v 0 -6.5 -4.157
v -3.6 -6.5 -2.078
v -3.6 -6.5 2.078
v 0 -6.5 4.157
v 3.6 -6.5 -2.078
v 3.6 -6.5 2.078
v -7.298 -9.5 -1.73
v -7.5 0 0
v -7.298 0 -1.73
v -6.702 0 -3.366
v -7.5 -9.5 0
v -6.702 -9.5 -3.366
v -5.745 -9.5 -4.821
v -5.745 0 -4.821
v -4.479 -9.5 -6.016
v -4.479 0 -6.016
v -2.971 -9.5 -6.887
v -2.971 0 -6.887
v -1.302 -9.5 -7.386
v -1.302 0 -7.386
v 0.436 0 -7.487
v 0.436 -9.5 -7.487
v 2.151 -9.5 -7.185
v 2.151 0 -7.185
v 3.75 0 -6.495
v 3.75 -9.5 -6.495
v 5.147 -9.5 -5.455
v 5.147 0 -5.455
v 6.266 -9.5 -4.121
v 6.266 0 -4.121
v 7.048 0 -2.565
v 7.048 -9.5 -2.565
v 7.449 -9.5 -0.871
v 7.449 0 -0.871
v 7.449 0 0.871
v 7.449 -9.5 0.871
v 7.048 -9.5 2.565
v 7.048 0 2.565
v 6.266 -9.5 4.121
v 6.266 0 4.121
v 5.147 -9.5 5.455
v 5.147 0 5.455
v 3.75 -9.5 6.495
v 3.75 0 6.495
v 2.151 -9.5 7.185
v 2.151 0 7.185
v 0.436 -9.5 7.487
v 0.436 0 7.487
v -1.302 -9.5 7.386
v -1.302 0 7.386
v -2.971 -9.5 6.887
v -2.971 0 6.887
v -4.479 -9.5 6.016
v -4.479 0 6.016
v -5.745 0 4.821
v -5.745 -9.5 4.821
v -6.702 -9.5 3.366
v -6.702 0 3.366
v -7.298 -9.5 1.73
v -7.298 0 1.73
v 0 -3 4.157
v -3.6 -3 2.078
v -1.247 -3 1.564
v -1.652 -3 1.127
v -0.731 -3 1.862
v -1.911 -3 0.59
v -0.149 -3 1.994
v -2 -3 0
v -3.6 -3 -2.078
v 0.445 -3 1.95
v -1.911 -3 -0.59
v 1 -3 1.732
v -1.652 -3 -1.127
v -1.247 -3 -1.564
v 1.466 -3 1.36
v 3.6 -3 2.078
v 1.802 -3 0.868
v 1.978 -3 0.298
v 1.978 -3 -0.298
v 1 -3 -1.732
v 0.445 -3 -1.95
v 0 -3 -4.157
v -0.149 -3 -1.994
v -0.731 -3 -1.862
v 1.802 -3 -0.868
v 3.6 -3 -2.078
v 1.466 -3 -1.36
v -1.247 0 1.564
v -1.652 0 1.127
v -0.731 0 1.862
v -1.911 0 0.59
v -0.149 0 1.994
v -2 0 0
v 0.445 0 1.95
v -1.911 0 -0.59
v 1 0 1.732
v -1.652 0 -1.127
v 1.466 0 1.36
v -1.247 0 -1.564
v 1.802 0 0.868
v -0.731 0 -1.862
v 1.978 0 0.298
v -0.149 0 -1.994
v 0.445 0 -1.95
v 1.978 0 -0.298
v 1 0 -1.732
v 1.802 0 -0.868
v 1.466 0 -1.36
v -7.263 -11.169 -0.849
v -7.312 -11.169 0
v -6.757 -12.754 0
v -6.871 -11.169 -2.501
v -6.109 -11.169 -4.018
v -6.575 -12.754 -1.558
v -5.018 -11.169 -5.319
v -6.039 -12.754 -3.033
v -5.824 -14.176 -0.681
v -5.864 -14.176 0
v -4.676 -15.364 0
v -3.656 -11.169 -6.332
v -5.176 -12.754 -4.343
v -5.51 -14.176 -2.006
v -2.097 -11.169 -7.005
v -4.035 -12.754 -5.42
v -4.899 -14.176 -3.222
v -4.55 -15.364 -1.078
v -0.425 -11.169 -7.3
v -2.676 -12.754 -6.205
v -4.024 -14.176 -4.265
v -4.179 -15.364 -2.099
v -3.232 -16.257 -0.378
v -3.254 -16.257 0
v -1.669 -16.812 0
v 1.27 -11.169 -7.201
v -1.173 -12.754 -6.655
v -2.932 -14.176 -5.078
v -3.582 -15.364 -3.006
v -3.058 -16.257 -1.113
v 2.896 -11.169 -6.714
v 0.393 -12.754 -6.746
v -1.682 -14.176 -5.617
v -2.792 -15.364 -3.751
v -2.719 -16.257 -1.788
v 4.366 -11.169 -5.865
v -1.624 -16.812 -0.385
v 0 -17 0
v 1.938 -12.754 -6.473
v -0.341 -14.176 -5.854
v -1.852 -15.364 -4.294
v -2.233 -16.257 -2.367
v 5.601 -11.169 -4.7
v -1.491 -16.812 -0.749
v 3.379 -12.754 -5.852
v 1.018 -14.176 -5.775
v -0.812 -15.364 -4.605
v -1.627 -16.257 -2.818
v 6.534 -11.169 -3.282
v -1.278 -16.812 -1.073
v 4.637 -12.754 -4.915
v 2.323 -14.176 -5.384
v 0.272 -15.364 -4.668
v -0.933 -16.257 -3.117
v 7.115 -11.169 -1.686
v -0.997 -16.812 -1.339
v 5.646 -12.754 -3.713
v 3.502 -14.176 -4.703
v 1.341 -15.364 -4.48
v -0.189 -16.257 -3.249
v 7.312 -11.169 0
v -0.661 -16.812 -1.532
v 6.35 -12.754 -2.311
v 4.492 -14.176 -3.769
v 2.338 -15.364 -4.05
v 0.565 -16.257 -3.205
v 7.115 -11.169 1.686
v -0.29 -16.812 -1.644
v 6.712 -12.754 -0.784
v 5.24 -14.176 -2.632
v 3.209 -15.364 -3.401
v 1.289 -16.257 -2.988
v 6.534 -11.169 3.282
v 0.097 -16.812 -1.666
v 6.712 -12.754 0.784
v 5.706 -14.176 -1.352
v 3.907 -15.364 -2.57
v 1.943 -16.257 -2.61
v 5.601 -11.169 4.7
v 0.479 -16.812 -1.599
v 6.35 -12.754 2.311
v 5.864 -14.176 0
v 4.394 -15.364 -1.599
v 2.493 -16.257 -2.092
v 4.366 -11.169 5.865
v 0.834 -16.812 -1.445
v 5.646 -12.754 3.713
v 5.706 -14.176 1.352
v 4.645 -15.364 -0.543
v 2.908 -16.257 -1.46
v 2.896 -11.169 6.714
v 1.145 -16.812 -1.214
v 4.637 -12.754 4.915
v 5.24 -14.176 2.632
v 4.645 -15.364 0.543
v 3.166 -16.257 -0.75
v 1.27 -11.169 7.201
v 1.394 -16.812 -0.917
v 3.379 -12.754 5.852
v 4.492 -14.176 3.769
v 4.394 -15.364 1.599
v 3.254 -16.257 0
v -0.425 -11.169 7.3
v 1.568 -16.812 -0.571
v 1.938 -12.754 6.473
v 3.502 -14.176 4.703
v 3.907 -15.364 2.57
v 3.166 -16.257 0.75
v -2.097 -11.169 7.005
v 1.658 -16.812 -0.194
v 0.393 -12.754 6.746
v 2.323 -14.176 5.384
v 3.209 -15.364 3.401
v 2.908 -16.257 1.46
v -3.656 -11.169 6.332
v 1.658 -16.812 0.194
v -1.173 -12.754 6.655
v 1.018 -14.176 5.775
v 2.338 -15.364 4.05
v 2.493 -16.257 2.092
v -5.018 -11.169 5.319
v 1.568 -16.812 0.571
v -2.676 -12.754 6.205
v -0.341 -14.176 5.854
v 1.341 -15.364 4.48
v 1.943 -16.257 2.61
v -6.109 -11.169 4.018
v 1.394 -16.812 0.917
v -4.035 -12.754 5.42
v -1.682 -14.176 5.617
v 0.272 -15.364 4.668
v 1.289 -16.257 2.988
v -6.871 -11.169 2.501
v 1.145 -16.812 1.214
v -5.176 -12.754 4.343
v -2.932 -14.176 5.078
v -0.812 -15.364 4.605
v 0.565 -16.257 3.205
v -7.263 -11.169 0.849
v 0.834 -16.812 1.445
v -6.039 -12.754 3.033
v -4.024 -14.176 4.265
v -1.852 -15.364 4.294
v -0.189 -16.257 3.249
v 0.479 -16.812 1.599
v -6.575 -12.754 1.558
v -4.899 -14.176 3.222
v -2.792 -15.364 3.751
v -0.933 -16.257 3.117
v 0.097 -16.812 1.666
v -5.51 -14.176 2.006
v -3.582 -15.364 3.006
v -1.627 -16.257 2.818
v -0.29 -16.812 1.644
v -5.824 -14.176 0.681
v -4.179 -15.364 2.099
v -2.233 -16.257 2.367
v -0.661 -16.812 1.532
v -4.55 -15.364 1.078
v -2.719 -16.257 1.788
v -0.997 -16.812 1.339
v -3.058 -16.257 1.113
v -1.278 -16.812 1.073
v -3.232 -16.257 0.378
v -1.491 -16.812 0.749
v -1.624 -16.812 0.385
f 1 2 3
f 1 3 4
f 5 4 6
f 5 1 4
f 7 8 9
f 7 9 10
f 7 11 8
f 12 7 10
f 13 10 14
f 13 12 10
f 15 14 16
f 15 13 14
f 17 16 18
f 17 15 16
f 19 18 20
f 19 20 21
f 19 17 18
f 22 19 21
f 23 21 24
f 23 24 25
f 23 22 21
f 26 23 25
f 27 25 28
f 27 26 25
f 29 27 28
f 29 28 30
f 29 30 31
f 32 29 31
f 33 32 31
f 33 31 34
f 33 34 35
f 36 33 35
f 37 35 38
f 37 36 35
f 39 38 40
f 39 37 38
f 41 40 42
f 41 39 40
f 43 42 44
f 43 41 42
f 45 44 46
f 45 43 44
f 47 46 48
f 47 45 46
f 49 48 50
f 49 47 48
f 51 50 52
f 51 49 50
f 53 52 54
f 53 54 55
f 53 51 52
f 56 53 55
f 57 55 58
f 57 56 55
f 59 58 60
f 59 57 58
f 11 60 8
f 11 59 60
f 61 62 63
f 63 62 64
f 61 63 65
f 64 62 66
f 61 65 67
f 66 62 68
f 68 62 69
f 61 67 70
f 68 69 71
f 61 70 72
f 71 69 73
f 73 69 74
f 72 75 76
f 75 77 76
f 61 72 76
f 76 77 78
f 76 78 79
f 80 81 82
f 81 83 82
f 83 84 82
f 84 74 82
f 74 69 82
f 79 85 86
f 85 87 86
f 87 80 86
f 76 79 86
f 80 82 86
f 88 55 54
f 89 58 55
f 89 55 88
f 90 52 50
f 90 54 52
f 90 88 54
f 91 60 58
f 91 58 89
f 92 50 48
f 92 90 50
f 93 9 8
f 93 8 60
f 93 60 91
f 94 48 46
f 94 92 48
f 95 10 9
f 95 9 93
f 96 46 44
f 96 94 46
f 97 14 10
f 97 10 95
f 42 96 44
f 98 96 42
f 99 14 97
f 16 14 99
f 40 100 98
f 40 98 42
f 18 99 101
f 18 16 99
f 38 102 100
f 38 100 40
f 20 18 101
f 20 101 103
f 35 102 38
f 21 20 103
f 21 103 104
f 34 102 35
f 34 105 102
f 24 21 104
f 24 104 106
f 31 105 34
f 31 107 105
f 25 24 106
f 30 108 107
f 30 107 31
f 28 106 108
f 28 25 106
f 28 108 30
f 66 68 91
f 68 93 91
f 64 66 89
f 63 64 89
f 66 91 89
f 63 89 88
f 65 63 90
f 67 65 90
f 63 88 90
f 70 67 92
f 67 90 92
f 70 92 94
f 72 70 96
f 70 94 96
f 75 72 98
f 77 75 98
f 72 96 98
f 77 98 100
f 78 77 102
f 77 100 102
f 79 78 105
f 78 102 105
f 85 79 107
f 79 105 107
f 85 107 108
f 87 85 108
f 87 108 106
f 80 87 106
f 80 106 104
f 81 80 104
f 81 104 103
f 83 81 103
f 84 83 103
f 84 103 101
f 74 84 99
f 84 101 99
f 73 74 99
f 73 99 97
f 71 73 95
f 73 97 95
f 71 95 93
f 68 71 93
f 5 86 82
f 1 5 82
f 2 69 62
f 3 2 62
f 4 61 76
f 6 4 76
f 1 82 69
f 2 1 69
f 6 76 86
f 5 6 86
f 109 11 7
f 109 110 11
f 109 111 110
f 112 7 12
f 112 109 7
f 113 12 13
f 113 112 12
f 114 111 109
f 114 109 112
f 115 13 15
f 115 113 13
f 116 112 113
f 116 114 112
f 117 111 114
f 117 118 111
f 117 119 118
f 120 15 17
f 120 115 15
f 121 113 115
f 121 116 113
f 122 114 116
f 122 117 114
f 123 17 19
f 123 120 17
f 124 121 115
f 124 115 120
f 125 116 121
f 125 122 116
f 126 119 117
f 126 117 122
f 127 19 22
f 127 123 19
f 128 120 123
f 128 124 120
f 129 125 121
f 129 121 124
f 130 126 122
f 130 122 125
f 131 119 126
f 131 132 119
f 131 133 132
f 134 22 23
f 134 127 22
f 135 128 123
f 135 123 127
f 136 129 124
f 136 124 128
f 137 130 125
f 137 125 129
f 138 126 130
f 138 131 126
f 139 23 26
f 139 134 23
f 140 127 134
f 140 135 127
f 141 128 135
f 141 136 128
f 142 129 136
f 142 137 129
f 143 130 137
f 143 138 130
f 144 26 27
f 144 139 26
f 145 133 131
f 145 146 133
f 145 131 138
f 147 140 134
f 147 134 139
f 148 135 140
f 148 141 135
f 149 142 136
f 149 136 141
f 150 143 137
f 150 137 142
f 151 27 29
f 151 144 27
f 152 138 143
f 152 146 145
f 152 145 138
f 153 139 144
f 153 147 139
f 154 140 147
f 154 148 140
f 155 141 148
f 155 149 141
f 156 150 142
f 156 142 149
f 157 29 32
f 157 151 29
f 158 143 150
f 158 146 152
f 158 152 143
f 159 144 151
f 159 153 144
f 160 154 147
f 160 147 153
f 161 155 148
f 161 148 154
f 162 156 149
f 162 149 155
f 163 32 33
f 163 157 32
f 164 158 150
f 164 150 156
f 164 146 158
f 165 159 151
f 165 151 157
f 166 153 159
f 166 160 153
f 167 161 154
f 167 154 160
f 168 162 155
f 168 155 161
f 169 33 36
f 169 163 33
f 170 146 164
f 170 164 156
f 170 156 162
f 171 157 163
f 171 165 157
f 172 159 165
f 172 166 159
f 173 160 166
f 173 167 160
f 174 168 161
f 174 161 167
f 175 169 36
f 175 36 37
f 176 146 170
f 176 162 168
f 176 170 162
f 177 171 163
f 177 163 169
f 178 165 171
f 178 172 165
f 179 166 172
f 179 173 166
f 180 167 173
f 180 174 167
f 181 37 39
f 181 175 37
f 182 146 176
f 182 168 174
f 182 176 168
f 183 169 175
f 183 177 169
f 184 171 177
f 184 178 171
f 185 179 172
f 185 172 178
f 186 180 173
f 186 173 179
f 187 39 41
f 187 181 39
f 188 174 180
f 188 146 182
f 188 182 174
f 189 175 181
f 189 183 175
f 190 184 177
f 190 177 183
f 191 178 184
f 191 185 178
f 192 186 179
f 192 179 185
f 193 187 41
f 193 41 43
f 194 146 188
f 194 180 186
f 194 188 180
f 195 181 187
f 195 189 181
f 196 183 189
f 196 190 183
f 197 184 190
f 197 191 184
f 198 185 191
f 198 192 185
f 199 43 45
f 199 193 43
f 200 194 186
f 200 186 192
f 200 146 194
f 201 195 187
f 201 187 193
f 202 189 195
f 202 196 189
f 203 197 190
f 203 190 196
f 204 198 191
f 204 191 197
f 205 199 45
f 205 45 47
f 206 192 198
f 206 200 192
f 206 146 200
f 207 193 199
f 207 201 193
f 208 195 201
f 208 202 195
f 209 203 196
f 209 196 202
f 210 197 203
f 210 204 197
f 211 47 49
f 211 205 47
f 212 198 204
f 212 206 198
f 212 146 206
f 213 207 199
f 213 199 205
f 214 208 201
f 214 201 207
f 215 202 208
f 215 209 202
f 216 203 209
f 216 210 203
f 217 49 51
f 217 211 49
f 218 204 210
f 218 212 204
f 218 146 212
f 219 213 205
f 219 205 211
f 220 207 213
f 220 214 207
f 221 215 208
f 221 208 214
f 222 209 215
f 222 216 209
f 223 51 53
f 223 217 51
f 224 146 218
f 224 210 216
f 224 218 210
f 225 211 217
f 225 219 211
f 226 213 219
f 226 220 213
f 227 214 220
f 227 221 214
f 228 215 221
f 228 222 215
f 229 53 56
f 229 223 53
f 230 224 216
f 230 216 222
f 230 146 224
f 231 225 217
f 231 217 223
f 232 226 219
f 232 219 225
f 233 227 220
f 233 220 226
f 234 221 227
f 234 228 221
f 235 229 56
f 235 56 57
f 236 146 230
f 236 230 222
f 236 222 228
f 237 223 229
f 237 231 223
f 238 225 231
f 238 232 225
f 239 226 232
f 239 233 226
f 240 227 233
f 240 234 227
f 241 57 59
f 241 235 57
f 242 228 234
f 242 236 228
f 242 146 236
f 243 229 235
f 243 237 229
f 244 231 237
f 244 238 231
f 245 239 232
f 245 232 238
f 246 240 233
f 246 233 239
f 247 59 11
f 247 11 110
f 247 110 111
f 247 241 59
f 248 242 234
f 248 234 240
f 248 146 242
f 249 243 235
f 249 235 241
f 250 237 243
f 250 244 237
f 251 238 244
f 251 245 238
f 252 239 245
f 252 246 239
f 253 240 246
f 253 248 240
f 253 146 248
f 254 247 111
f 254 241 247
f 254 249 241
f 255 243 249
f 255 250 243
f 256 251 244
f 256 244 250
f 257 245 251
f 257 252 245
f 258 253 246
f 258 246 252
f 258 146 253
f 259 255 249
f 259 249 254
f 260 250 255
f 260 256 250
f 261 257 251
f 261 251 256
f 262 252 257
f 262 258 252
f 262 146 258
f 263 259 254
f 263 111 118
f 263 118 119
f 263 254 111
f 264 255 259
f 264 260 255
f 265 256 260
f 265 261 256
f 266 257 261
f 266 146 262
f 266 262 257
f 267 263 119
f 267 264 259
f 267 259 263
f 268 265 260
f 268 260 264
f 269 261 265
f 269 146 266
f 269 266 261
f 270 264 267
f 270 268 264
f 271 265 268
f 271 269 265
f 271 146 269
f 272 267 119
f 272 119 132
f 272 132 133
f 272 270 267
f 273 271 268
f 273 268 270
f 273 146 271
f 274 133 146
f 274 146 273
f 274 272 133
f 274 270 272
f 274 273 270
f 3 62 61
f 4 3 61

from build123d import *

# Parameters (mm, degrees)
CUT_EXTRUDE1_START = -3
CUT_EXTRUDE1_DEPTH = 3.5
CUT_EXTRUDE2_REACH = 22.037
SKETCH3_R          = 2


with BuildPart() as part:
    # Sketch1 → Revolve1 (revolve)
    with BuildSketch(Plane.XY):
        with BuildLine():
            Line((0, 0), (-7.5, 0))
            Line((-7.5, 0), (-7.5, -9.5))
            ThreePointArc((-7.5, -9.5), (-5.303300859, -14.803300859), (0, -17))
            Line((0, -17), (0, 0))
        make_face()
    revolve(axis=Axis((0, 0, 0), (0, -1, 0)))

    # Sketch2 → Cut-Extrude1 (cut)
    with BuildSketch(Plane(origin=(0, 0, 0), x_dir=(1, 0, 0), z_dir=(0, 1, 0)).offset(CUT_EXTRUDE1_START)):
        Polygon((3.6, -2.078460969), (3.6, 2.078460969), (0, 4.156921938), (-3.6, 2.078460969), (-3.6, -2.078460969), (0, -4.156921938), align=None)
    extrude(amount=-CUT_EXTRUDE1_DEPTH, mode=Mode.SUBTRACT)

    # Sketch3 → Cut-Extrude2 (cut, up to next)
    with BuildSketch(Plane(origin=(0, 0, 0), x_dir=(1, 0, 0), z_dir=(0, 1, 0)), mode=Mode.PRIVATE) as cut_extrude2_sk1:
        with Locations(Location((0, 0, 0), (0, 0, 180))):
            Circle(SKETCH3_R)
    cut_extrude2_tool1 = extrude(cut_extrude2_sk1.sketch, amount=-CUT_EXTRUDE2_REACH, mode=Mode.PRIVATE) & part.part
    add(cut_extrude2_tool1.solids().sort_by_distance((0, 0, 0))[0], mode=Mode.SUBTRACT)


solid = part.part
